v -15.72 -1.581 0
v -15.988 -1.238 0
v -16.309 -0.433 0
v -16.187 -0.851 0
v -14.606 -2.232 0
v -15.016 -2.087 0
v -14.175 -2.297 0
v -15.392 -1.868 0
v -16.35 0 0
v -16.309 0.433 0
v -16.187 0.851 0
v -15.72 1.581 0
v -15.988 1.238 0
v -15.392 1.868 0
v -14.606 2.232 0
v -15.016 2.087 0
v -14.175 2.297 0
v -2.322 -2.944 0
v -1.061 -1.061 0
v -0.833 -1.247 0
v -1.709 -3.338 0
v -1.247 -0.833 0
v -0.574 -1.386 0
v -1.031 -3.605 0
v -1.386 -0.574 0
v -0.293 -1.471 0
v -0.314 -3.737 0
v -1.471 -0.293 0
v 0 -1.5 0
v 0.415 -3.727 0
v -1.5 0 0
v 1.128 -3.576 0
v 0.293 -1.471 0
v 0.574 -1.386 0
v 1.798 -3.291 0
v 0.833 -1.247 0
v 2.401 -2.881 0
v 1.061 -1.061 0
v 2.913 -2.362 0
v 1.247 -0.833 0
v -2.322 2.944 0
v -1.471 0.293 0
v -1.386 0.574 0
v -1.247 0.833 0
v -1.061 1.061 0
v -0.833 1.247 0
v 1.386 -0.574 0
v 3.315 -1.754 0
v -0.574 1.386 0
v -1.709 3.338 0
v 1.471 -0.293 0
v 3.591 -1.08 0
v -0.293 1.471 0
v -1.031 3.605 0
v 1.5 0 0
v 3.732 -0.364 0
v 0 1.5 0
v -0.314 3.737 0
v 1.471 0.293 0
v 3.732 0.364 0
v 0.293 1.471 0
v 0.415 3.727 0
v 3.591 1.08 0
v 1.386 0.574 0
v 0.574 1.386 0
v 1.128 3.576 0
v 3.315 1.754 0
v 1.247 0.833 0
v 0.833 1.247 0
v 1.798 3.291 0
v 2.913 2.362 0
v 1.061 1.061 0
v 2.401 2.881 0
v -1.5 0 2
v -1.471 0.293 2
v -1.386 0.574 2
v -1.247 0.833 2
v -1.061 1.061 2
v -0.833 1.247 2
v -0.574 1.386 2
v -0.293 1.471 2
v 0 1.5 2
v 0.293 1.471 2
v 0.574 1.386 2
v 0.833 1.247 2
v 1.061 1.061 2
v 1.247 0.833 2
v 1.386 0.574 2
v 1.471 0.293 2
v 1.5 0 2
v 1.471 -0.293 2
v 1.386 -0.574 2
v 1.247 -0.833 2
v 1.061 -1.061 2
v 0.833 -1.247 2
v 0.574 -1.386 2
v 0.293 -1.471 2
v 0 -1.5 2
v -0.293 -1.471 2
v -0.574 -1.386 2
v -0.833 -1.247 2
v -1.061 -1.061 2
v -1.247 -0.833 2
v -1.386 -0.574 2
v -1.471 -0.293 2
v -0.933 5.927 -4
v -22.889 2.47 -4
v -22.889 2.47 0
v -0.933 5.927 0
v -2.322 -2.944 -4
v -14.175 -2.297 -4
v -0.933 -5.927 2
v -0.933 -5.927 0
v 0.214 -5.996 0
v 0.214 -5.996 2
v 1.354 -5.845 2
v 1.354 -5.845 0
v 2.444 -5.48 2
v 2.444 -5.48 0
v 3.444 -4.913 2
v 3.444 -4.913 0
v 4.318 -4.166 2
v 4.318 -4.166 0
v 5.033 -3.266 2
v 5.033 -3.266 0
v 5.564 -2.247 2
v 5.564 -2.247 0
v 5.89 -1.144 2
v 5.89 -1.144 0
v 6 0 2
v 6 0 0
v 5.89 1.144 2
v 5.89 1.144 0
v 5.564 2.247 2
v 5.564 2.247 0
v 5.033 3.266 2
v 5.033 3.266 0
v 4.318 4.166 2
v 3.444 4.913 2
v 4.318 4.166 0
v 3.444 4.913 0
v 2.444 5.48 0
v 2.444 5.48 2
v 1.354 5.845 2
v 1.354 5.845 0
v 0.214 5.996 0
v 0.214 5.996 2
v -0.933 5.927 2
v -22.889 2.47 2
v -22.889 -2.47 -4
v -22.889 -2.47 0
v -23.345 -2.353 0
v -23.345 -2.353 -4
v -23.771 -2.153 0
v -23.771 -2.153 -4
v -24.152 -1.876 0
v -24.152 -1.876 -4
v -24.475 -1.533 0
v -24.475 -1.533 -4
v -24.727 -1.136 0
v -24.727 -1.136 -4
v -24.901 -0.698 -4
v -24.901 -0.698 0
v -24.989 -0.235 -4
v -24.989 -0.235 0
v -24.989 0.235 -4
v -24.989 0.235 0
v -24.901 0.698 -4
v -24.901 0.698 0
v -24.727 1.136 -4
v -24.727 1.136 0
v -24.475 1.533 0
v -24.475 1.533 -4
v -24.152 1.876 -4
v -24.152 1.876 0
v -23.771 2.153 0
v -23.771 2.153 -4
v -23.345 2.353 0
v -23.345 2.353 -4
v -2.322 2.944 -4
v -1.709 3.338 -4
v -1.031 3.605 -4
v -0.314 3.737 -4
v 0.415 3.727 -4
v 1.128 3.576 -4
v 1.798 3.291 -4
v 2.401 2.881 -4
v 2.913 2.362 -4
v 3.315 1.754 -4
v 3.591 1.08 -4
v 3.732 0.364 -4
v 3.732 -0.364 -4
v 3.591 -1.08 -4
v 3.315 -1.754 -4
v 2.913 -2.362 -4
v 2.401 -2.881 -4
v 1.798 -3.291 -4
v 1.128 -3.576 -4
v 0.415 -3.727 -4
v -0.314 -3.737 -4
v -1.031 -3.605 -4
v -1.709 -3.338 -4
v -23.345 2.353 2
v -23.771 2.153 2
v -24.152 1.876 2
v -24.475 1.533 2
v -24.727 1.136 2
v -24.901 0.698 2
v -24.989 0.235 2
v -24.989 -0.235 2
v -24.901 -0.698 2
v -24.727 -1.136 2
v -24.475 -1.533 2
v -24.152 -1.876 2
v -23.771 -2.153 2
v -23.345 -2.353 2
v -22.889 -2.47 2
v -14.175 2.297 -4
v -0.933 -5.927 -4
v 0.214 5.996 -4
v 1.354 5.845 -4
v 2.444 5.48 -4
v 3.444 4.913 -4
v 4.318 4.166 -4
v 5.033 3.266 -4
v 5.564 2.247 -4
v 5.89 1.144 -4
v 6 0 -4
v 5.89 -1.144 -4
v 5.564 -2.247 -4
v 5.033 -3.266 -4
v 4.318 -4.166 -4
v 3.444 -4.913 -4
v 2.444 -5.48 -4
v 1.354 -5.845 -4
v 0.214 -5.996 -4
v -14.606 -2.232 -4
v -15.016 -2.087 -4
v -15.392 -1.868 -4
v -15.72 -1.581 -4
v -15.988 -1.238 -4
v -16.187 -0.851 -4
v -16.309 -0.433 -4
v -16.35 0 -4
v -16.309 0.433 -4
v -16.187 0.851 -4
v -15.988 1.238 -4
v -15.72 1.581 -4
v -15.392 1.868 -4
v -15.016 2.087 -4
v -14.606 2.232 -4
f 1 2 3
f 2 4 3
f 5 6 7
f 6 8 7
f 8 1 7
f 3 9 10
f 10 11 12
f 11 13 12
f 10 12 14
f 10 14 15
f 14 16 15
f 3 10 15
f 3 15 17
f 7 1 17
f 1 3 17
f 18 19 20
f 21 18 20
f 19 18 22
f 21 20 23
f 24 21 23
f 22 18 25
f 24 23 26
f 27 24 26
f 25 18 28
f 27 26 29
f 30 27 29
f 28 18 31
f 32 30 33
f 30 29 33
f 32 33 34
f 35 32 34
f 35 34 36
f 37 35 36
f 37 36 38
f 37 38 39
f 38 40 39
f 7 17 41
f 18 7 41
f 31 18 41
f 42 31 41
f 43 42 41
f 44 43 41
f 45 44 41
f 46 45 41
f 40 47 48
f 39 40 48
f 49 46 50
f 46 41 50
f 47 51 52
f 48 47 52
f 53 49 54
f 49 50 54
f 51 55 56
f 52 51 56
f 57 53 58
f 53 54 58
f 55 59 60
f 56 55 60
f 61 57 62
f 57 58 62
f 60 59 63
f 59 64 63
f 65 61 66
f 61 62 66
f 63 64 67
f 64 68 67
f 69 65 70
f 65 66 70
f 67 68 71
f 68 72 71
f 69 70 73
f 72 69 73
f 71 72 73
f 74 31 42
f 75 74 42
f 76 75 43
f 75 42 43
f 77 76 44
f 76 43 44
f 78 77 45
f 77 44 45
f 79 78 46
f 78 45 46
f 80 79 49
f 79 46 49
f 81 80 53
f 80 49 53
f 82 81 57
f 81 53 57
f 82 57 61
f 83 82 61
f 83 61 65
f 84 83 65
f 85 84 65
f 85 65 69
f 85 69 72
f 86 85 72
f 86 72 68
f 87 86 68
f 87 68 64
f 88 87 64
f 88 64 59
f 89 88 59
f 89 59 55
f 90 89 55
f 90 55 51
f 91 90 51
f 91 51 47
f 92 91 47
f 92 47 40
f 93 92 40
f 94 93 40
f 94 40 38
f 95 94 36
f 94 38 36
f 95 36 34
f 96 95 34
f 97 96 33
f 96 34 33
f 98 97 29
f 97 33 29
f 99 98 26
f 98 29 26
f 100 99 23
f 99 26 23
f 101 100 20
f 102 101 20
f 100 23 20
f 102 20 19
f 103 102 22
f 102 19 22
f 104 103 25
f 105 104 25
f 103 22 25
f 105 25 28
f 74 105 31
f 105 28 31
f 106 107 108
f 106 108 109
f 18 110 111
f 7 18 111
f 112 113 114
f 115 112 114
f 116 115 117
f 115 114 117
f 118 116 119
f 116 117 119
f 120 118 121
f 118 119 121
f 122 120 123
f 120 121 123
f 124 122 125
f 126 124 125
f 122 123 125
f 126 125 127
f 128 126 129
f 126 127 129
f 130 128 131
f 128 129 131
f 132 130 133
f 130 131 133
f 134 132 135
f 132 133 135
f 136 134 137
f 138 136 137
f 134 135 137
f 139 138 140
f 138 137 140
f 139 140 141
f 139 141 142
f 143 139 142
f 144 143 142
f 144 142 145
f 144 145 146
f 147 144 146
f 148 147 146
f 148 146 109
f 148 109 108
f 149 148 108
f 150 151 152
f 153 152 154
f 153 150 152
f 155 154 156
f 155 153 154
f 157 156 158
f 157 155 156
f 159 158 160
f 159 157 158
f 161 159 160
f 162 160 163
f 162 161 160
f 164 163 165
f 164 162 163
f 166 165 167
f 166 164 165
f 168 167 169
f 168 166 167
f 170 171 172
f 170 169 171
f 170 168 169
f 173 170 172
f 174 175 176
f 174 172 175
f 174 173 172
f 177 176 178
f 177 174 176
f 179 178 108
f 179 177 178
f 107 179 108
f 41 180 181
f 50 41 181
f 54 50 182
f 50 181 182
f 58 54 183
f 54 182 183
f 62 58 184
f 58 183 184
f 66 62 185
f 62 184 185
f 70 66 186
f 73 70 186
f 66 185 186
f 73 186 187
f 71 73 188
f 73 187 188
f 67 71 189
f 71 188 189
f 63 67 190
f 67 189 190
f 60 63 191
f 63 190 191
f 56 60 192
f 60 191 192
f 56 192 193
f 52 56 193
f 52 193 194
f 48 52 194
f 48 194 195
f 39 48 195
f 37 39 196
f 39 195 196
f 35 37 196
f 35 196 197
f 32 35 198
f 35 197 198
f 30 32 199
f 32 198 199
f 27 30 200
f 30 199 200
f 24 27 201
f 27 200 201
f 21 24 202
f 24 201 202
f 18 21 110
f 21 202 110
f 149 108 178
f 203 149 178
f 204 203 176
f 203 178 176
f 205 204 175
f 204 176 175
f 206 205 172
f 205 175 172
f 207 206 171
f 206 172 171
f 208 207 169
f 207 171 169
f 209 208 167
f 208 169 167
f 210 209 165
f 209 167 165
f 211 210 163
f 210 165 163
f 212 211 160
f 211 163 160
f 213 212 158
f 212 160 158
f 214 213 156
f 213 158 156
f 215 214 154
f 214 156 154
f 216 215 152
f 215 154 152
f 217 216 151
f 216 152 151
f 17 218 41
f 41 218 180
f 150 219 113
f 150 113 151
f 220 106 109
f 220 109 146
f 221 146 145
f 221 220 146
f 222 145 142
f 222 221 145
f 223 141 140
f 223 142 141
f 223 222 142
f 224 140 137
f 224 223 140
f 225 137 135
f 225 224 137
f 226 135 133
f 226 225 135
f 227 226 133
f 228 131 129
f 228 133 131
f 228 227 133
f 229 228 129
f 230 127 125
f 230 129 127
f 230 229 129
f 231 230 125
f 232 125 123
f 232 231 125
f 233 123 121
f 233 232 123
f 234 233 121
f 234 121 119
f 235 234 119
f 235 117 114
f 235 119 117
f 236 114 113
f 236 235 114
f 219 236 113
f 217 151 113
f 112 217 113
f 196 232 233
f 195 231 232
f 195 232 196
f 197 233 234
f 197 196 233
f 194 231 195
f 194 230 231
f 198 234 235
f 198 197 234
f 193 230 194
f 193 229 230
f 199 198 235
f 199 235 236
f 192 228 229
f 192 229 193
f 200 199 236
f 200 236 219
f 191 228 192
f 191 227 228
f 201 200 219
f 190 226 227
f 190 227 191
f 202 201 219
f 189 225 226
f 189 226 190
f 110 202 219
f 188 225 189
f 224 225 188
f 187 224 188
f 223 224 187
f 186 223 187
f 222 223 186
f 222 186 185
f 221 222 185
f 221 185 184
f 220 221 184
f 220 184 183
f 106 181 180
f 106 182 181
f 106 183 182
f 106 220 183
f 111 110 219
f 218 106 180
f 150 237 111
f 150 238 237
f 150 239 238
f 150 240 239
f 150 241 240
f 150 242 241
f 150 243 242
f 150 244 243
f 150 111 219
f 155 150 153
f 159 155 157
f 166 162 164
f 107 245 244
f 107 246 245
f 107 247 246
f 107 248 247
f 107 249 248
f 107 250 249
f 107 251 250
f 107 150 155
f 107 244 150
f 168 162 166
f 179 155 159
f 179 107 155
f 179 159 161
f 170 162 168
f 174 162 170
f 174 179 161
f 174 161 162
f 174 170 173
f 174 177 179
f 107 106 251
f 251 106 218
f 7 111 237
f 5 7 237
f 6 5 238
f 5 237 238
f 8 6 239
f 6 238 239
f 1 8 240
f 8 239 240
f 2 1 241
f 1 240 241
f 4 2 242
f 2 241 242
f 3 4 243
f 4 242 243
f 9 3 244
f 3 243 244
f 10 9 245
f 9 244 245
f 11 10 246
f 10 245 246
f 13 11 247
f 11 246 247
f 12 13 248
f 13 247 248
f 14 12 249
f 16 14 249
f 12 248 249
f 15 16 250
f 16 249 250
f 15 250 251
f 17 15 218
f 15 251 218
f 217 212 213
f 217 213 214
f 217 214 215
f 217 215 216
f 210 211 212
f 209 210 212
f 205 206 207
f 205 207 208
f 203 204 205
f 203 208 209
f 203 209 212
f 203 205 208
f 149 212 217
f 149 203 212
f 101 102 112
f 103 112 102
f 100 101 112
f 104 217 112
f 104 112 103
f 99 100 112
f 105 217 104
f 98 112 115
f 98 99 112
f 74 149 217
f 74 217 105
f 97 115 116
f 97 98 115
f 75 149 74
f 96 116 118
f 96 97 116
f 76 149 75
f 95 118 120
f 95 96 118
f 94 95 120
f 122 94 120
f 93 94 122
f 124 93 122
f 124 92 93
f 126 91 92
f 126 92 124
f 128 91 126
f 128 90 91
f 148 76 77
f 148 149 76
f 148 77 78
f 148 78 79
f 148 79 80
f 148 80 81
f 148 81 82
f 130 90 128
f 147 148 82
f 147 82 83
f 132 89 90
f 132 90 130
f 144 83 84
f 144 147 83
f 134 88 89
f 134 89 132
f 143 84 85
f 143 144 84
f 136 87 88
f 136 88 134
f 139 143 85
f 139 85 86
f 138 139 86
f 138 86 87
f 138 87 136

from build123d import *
from build123d.topology import SkipClean

# Parameters (mm, degrees)
BOSS_EXTRUDE1_DEPTH = 2
BOSS_EXTRUDE2_START = 4
BOSS_EXTRUDE2_DEPTH = 4
SKETCH3_R           = 1.5
CUT_EXTRUDE1_DEPTH  = 27.019223663


with BuildPart() as part:
    # Sketch1 → Boss-Extrude1 (new body)
    with BuildSketch(Plane.XY):
        with BuildLine():
            Line((-22.888888889, -2.469567863), (-0.933333333, -5.926962872))
            ThreePointArc((-0.933333333, -5.926962872), (6, 0), (-0.933333333, 5.926962872))
            Line((-0.933333333, 5.926962872), (-22.888888889, 2.469567863))
            ThreePointArc((-22.888888889, 2.469567863), (-25, 0), (-22.888888889, -2.469567863))
        make_face()
    extrude(amount=BOSS_EXTRUDE1_DEPTH)

    # Sketch2 → Boss-Extrude2 (add)
    with SkipClean():  # the faces are left unmerged after this step: merging them gives an invalid solid
        with BuildSketch(Plane(origin=(0, 0, 0), x_dir=(-1, 0, 0), z_dir=(0, 0, -1)).offset(BOSS_EXTRUDE2_START)):
            with BuildLine():
                Line((22.888888889, 2.469567863), (0.933333333, 5.926962872))
                ThreePointArc((0.933333333, 5.926962872), (-6, 0), (0.933333333, -5.926962872))
                Line((0.933333333, -5.926962872), (22.888888889, -2.469567863))
                ThreePointArc((22.888888889, -2.469567863), (25, 0), (22.888888889, 2.469567863))
            make_face()
            with BuildLine():
                Line((14.175490262, 2.296574012), (2.322474144, 2.944250983))
                ThreePointArc((2.322474144, 2.944250983), (-3.75, 0), (2.322474144, -2.944250983))
                Line((2.322474144, -2.944250983), (14.175490262, -2.296574012))
                ThreePointArc((14.175490262, -2.296574012), (16.35, 0), (14.175490262, 2.296574012))
            make_face(mode=Mode.SUBTRACT)
        extrude(amount=-BOSS_EXTRUDE2_DEPTH)

    # Sketch3 → Cut-Extrude1 (cut, through all)
    with SkipClean():  # the faces are left unmerged after this step: merging them gives an invalid solid
        with BuildSketch(Plane(origin=(0, 0, 0), x_dir=(-1, 0, 0), z_dir=(0, 0, -1))):
            Circle(SKETCH3_R)
        extrude(amount=-CUT_EXTRUDE1_DEPTH, mode=Mode.SUBTRACT)


solid = part.part
